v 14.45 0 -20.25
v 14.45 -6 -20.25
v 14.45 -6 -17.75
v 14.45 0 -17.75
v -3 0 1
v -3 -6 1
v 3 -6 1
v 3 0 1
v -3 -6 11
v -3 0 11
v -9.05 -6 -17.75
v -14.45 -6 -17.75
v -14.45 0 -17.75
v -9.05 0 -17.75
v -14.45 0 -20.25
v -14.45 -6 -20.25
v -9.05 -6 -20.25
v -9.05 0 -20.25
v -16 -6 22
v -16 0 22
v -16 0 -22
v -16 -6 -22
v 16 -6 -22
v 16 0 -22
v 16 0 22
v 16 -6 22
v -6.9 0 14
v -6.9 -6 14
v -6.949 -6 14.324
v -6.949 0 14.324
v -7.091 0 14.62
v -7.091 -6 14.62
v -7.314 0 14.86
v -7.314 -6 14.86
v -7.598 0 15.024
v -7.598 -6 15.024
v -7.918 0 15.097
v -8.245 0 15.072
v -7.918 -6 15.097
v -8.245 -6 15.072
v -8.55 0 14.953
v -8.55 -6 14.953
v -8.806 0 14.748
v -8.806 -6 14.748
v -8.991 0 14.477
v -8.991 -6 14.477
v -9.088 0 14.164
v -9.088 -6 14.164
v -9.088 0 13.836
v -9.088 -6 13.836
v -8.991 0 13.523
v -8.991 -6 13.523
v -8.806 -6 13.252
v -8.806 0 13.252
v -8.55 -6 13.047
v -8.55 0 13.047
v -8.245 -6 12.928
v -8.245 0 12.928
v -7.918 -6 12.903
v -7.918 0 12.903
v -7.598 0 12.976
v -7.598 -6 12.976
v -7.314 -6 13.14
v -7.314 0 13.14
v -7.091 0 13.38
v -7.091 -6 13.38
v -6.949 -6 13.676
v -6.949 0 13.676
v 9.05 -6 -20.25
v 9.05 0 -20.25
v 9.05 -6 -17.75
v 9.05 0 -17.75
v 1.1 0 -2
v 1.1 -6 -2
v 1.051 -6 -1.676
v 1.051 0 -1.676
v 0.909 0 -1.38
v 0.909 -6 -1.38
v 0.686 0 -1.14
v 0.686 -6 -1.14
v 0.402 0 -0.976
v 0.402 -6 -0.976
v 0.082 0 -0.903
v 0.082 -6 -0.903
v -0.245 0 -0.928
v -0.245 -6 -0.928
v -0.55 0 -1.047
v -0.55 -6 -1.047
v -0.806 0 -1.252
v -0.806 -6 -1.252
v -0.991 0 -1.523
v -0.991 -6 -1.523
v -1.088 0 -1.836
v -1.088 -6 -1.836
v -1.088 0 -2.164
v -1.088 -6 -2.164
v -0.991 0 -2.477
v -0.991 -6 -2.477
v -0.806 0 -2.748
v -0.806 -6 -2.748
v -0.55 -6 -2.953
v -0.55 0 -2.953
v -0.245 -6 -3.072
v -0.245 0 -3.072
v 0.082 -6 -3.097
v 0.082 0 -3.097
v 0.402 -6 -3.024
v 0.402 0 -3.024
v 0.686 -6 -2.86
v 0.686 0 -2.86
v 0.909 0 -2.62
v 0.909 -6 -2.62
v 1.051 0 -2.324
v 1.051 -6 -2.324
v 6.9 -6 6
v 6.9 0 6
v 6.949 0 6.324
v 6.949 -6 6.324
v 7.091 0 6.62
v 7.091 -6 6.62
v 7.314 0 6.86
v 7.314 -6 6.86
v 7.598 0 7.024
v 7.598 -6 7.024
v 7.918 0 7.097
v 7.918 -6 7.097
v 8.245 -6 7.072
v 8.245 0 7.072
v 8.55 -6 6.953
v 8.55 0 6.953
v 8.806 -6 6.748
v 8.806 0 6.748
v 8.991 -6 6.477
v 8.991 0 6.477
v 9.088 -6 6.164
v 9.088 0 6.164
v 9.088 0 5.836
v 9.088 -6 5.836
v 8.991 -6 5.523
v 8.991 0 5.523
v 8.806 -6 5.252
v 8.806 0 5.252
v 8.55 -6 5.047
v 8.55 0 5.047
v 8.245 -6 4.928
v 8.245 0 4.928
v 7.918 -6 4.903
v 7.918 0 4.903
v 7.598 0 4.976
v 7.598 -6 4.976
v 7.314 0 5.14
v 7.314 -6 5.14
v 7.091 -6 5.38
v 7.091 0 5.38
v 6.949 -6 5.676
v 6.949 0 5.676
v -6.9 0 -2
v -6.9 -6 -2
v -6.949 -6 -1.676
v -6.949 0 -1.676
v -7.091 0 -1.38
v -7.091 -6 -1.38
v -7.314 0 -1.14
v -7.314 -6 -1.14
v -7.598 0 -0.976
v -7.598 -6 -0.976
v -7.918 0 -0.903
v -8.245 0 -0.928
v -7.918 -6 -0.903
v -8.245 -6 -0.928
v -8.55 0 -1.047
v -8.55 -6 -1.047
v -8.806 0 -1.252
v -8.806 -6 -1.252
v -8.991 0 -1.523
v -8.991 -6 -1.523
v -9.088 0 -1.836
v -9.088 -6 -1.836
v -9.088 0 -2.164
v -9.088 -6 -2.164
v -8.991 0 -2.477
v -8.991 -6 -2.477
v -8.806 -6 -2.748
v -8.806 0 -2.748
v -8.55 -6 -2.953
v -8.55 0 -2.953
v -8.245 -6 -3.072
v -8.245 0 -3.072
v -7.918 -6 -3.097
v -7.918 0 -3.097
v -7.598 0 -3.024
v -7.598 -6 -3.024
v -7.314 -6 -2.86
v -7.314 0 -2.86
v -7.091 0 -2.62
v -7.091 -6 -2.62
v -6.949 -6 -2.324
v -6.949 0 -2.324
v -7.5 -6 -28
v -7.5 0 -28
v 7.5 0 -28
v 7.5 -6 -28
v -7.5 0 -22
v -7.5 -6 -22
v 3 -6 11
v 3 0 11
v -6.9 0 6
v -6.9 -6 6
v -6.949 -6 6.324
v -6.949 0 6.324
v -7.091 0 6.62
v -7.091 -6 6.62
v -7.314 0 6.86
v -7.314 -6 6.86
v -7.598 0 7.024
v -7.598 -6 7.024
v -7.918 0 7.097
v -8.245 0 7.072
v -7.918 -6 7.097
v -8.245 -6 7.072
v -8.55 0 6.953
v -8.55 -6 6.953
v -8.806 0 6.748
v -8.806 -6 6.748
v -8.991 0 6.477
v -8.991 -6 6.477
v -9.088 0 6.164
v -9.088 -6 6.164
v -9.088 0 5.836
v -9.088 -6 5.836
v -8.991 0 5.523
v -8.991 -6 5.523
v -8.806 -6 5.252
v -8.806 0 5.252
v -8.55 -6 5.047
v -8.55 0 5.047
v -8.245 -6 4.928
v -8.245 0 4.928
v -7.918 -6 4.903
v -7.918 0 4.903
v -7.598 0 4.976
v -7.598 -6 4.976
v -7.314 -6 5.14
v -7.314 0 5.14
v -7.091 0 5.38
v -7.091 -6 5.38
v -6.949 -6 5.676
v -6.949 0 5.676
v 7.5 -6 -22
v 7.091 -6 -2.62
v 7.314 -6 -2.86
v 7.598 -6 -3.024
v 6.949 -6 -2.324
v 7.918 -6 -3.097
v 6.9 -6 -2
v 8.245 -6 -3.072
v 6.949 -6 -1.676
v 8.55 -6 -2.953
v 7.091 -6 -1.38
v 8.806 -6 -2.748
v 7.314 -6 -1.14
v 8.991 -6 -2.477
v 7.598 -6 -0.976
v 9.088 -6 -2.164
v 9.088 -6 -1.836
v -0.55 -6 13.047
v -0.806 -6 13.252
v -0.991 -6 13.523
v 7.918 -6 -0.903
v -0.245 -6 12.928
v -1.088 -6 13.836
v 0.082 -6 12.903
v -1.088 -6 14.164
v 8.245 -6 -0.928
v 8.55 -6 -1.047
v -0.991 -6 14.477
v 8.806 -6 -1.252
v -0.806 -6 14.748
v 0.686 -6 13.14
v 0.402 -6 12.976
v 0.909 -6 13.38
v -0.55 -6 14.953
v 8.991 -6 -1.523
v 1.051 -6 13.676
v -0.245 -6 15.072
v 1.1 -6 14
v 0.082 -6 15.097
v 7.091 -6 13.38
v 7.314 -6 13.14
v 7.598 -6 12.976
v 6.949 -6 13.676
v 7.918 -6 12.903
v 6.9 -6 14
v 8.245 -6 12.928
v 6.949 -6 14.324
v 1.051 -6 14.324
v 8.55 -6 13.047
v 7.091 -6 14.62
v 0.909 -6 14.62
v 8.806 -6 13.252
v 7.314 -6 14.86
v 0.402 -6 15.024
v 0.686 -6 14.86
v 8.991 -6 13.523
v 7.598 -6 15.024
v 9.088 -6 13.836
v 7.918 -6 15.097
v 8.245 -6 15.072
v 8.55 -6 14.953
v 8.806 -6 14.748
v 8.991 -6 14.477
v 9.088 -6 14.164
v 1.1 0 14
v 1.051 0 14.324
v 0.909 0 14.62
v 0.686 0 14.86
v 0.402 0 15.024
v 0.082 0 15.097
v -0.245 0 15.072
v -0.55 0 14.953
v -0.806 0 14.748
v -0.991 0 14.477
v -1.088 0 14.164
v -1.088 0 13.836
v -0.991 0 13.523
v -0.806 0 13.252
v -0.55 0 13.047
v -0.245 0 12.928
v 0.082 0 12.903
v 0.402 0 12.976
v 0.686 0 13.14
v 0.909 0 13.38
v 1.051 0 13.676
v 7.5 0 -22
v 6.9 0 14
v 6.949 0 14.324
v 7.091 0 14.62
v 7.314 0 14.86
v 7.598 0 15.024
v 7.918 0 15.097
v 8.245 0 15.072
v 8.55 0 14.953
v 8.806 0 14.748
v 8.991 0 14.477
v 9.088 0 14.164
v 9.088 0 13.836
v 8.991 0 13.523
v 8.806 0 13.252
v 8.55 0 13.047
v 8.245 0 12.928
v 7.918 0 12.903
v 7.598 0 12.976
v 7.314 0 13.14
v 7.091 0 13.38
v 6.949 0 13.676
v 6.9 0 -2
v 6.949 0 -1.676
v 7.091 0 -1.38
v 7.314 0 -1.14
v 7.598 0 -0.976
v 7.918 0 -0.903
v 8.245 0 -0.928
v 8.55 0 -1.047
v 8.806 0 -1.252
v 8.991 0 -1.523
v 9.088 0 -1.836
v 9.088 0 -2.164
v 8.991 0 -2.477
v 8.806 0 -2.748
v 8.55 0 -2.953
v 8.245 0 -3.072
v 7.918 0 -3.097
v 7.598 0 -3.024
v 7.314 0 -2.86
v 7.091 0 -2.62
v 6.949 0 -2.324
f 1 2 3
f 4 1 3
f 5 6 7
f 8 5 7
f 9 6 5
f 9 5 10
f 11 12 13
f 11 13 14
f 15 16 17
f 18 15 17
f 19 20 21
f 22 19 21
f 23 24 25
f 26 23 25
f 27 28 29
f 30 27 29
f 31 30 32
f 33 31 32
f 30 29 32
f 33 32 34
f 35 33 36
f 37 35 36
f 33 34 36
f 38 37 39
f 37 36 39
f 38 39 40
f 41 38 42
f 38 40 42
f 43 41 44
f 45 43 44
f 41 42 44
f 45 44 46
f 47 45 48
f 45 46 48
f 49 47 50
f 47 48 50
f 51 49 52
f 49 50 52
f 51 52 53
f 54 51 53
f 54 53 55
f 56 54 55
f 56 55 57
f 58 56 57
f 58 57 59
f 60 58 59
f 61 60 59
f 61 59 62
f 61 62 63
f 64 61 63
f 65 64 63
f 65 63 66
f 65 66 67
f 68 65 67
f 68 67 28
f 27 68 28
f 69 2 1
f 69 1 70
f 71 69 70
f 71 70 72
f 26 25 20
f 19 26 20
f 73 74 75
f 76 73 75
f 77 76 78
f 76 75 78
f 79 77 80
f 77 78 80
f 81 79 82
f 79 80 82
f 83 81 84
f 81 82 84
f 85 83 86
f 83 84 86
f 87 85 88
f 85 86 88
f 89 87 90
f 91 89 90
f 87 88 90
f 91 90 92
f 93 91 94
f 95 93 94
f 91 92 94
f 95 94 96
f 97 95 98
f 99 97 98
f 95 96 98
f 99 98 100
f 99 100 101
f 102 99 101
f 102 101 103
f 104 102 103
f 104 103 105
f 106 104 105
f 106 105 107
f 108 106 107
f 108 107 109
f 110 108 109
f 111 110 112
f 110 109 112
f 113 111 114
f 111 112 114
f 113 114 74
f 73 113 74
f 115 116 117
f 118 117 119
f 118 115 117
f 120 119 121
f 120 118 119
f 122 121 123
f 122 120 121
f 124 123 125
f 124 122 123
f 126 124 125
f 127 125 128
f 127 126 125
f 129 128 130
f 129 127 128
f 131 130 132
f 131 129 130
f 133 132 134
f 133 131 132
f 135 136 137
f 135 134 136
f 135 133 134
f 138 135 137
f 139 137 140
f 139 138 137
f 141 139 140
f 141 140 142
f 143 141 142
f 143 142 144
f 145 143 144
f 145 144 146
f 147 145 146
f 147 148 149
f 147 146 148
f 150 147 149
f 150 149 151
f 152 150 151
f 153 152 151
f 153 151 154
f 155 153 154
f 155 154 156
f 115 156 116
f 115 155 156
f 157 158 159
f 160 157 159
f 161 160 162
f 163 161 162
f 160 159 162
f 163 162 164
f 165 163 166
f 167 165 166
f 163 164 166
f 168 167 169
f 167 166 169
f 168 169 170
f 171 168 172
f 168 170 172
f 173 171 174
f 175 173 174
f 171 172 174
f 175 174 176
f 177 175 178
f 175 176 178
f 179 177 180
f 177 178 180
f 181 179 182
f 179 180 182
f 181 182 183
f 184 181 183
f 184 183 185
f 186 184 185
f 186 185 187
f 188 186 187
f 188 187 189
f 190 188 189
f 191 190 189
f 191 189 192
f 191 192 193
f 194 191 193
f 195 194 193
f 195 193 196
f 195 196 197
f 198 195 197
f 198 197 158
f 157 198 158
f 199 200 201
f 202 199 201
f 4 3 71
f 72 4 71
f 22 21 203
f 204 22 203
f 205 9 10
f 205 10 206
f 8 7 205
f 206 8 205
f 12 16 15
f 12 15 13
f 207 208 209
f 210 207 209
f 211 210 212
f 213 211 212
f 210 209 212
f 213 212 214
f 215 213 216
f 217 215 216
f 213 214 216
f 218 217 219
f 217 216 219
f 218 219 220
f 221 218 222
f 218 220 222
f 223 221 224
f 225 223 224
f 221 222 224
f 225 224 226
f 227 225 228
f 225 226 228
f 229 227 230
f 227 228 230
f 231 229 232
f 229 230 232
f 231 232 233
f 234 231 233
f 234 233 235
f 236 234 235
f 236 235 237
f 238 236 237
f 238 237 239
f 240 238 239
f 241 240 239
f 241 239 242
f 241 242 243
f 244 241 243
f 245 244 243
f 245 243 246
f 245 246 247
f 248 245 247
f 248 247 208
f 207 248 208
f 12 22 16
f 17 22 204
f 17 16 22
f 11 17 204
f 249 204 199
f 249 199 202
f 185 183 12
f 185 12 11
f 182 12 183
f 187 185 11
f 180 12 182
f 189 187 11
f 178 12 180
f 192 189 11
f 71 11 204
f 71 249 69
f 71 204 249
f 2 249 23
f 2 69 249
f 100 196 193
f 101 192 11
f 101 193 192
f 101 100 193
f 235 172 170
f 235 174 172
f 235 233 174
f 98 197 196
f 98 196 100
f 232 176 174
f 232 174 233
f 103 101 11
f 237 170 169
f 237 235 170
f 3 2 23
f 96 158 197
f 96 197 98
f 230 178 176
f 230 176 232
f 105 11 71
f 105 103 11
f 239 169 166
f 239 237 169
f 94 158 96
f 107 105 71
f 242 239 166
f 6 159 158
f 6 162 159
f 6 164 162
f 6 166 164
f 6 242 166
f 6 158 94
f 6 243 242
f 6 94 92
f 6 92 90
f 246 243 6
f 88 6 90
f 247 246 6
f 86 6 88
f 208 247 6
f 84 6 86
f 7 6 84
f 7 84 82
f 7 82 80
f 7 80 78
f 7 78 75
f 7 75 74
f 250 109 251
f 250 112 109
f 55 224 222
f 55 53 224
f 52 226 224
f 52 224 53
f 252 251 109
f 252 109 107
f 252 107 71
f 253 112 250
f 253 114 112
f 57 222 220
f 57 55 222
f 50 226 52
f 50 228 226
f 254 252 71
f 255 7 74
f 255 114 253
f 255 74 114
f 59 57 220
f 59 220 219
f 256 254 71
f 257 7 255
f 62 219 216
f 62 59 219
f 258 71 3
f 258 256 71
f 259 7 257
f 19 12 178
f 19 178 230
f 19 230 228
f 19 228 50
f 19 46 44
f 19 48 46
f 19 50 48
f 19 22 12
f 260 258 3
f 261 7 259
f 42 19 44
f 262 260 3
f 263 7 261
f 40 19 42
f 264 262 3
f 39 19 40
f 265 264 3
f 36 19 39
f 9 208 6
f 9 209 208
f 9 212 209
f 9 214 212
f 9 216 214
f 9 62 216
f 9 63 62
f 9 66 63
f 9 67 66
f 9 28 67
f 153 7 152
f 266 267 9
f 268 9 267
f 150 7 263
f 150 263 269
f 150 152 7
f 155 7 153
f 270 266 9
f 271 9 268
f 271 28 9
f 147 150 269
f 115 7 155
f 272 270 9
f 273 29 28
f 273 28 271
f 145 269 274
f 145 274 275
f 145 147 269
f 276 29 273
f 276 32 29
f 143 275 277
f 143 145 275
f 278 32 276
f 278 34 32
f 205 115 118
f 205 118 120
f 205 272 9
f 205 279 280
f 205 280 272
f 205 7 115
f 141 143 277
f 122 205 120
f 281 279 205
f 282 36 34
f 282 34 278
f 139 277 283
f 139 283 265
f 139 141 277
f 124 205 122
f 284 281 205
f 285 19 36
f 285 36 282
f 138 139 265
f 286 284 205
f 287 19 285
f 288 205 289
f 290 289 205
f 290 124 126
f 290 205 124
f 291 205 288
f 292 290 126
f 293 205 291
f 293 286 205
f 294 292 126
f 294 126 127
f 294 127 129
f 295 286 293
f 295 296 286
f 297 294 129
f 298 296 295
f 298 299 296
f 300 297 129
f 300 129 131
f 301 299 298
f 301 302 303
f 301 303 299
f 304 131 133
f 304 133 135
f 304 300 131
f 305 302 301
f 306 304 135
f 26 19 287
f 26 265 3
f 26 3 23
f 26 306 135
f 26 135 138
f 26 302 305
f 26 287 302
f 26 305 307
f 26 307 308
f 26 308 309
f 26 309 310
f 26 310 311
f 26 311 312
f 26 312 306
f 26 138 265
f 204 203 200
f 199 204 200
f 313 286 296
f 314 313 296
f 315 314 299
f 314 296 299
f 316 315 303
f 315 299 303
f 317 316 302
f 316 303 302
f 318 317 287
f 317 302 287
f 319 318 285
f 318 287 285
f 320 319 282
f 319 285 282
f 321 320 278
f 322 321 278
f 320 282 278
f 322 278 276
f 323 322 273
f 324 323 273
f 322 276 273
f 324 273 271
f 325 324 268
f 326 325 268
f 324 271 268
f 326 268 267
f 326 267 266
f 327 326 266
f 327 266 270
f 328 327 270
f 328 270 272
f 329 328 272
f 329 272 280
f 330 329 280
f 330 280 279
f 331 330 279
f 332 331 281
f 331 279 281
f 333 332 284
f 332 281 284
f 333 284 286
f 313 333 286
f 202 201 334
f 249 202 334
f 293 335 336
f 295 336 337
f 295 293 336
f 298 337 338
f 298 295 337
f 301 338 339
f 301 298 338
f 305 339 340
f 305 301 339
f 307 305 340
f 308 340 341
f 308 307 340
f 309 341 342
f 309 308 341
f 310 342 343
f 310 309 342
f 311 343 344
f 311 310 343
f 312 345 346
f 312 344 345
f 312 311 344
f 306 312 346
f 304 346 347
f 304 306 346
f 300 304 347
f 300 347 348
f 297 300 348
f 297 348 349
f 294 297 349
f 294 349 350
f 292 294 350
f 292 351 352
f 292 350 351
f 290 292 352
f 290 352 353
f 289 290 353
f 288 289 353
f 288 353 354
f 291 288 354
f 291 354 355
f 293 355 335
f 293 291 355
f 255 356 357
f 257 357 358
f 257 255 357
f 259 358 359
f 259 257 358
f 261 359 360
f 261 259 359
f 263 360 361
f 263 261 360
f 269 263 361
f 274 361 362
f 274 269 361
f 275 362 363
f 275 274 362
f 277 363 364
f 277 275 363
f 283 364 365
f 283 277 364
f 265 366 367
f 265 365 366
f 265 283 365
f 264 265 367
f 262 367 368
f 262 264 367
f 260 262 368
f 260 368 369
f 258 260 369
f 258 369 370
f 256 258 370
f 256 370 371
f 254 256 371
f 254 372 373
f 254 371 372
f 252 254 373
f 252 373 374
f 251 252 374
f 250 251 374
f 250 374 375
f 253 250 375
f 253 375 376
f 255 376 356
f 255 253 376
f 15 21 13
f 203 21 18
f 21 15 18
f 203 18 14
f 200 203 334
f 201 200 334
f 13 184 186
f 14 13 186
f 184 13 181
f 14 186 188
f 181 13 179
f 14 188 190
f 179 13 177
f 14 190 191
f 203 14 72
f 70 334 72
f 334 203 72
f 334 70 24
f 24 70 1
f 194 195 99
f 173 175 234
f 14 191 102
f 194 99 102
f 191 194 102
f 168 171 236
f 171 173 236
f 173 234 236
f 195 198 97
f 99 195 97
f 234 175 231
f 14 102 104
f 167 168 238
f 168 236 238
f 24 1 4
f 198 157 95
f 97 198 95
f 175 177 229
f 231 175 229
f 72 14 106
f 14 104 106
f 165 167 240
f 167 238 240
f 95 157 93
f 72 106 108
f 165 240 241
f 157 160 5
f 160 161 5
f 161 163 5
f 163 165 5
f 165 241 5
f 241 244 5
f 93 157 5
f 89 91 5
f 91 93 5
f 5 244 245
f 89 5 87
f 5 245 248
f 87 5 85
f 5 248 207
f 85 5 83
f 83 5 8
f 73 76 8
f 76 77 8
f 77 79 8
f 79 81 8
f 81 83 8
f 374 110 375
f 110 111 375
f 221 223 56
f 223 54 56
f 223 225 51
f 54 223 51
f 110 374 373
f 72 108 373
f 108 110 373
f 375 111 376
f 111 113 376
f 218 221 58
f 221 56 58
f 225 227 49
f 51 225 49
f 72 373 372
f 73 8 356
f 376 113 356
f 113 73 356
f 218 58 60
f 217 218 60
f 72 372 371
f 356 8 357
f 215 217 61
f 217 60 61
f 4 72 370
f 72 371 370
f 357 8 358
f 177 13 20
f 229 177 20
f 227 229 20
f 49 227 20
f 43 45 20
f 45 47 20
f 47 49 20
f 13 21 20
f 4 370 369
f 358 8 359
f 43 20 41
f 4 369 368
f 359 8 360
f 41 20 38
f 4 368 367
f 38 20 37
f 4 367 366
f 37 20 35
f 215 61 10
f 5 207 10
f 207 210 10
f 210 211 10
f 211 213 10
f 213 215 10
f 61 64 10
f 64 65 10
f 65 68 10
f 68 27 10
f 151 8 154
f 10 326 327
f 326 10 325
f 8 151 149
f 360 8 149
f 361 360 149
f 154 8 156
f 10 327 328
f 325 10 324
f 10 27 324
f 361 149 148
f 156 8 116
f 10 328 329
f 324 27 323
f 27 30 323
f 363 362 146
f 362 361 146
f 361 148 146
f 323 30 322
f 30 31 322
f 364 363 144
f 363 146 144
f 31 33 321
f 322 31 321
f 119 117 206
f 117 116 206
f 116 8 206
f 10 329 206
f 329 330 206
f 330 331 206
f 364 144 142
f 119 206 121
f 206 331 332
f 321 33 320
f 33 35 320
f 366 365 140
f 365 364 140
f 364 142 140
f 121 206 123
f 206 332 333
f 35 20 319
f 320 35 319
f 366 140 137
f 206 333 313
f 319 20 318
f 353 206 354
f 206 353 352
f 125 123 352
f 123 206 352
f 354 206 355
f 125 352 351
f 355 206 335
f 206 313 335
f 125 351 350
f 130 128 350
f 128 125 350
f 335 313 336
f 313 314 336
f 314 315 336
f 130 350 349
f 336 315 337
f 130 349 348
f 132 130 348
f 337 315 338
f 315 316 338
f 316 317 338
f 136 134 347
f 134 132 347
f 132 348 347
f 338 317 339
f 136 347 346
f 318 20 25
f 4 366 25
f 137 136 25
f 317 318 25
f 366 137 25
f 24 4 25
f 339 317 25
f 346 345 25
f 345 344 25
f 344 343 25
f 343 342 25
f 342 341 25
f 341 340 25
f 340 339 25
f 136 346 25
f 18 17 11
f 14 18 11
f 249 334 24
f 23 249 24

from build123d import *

# Parameters (mm, degrees)
PAD_DEPTH       = 6
SKETCH001_R     = 1.1
SKETCH001_W     = 6
SKETCH001_H     = 10
POCKET_DEPTH    = 125.332471
SKETCH002_W     = 5.4
SKETCH002_H     = 2.5
POCKET001_DEPTH = 125.332471


with BuildPart() as part:
    # Sketch → Pad (new body)
    with BuildSketch(Plane.XZ):
        Polygon((16, -22), (16, 22), (-16, 22), (-16, -22), (-7.5, -22), (-7.5, -28), (7.5, -28), (7.5, -22), align=None)
    extrude(amount=PAD_DEPTH)

    # Sketch001 (on Face10 of Pad) → Pocket (cut, through all)
    with BuildSketch(Plane.XZ.offset(6)):
        with Locations((0, 14)):
            Circle(SKETCH001_R)
        with Locations((-8, 6)):
            Circle(SKETCH001_R)
        with Locations((-8, 14)):
            Circle(SKETCH001_R)
        with Locations((-8, -2)):
            Circle(SKETCH001_R)
        with Locations((0, -2)):
            Circle(SKETCH001_R)
        with Locations((0, 6)):
            Rectangle(SKETCH001_W, SKETCH001_H)
    pocket = extrude(amount=-POCKET_DEPTH, mode=Mode.SUBTRACT)

    # Mirrored: Pocket across Sketch001 V_Axis
    add(pocket.mirror(Plane(origin=(0, -6, 0), x_dir=(0, -1, 0), z_dir=(1, 0, 0))), mode=Mode.SUBTRACT)

    # Sketch002 (on Face5 of Mirrored) → Pocket001 (cut, through all)
    with BuildSketch(Plane.XZ.offset(6)):
        with Locations((-11.75, -19)):
            Rectangle(SKETCH002_W, SKETCH002_H)
    pocket001 = extrude(amount=-POCKET001_DEPTH, mode=Mode.SUBTRACT)

    # Mirrored001: Pocket001 across Sketch002 V_Axis
    add(pocket001.mirror(Plane(origin=(0, -6, 0), x_dir=(0, -1, 0), z_dir=(1, 0, 0))), mode=Mode.SUBTRACT)


solid = part.part
